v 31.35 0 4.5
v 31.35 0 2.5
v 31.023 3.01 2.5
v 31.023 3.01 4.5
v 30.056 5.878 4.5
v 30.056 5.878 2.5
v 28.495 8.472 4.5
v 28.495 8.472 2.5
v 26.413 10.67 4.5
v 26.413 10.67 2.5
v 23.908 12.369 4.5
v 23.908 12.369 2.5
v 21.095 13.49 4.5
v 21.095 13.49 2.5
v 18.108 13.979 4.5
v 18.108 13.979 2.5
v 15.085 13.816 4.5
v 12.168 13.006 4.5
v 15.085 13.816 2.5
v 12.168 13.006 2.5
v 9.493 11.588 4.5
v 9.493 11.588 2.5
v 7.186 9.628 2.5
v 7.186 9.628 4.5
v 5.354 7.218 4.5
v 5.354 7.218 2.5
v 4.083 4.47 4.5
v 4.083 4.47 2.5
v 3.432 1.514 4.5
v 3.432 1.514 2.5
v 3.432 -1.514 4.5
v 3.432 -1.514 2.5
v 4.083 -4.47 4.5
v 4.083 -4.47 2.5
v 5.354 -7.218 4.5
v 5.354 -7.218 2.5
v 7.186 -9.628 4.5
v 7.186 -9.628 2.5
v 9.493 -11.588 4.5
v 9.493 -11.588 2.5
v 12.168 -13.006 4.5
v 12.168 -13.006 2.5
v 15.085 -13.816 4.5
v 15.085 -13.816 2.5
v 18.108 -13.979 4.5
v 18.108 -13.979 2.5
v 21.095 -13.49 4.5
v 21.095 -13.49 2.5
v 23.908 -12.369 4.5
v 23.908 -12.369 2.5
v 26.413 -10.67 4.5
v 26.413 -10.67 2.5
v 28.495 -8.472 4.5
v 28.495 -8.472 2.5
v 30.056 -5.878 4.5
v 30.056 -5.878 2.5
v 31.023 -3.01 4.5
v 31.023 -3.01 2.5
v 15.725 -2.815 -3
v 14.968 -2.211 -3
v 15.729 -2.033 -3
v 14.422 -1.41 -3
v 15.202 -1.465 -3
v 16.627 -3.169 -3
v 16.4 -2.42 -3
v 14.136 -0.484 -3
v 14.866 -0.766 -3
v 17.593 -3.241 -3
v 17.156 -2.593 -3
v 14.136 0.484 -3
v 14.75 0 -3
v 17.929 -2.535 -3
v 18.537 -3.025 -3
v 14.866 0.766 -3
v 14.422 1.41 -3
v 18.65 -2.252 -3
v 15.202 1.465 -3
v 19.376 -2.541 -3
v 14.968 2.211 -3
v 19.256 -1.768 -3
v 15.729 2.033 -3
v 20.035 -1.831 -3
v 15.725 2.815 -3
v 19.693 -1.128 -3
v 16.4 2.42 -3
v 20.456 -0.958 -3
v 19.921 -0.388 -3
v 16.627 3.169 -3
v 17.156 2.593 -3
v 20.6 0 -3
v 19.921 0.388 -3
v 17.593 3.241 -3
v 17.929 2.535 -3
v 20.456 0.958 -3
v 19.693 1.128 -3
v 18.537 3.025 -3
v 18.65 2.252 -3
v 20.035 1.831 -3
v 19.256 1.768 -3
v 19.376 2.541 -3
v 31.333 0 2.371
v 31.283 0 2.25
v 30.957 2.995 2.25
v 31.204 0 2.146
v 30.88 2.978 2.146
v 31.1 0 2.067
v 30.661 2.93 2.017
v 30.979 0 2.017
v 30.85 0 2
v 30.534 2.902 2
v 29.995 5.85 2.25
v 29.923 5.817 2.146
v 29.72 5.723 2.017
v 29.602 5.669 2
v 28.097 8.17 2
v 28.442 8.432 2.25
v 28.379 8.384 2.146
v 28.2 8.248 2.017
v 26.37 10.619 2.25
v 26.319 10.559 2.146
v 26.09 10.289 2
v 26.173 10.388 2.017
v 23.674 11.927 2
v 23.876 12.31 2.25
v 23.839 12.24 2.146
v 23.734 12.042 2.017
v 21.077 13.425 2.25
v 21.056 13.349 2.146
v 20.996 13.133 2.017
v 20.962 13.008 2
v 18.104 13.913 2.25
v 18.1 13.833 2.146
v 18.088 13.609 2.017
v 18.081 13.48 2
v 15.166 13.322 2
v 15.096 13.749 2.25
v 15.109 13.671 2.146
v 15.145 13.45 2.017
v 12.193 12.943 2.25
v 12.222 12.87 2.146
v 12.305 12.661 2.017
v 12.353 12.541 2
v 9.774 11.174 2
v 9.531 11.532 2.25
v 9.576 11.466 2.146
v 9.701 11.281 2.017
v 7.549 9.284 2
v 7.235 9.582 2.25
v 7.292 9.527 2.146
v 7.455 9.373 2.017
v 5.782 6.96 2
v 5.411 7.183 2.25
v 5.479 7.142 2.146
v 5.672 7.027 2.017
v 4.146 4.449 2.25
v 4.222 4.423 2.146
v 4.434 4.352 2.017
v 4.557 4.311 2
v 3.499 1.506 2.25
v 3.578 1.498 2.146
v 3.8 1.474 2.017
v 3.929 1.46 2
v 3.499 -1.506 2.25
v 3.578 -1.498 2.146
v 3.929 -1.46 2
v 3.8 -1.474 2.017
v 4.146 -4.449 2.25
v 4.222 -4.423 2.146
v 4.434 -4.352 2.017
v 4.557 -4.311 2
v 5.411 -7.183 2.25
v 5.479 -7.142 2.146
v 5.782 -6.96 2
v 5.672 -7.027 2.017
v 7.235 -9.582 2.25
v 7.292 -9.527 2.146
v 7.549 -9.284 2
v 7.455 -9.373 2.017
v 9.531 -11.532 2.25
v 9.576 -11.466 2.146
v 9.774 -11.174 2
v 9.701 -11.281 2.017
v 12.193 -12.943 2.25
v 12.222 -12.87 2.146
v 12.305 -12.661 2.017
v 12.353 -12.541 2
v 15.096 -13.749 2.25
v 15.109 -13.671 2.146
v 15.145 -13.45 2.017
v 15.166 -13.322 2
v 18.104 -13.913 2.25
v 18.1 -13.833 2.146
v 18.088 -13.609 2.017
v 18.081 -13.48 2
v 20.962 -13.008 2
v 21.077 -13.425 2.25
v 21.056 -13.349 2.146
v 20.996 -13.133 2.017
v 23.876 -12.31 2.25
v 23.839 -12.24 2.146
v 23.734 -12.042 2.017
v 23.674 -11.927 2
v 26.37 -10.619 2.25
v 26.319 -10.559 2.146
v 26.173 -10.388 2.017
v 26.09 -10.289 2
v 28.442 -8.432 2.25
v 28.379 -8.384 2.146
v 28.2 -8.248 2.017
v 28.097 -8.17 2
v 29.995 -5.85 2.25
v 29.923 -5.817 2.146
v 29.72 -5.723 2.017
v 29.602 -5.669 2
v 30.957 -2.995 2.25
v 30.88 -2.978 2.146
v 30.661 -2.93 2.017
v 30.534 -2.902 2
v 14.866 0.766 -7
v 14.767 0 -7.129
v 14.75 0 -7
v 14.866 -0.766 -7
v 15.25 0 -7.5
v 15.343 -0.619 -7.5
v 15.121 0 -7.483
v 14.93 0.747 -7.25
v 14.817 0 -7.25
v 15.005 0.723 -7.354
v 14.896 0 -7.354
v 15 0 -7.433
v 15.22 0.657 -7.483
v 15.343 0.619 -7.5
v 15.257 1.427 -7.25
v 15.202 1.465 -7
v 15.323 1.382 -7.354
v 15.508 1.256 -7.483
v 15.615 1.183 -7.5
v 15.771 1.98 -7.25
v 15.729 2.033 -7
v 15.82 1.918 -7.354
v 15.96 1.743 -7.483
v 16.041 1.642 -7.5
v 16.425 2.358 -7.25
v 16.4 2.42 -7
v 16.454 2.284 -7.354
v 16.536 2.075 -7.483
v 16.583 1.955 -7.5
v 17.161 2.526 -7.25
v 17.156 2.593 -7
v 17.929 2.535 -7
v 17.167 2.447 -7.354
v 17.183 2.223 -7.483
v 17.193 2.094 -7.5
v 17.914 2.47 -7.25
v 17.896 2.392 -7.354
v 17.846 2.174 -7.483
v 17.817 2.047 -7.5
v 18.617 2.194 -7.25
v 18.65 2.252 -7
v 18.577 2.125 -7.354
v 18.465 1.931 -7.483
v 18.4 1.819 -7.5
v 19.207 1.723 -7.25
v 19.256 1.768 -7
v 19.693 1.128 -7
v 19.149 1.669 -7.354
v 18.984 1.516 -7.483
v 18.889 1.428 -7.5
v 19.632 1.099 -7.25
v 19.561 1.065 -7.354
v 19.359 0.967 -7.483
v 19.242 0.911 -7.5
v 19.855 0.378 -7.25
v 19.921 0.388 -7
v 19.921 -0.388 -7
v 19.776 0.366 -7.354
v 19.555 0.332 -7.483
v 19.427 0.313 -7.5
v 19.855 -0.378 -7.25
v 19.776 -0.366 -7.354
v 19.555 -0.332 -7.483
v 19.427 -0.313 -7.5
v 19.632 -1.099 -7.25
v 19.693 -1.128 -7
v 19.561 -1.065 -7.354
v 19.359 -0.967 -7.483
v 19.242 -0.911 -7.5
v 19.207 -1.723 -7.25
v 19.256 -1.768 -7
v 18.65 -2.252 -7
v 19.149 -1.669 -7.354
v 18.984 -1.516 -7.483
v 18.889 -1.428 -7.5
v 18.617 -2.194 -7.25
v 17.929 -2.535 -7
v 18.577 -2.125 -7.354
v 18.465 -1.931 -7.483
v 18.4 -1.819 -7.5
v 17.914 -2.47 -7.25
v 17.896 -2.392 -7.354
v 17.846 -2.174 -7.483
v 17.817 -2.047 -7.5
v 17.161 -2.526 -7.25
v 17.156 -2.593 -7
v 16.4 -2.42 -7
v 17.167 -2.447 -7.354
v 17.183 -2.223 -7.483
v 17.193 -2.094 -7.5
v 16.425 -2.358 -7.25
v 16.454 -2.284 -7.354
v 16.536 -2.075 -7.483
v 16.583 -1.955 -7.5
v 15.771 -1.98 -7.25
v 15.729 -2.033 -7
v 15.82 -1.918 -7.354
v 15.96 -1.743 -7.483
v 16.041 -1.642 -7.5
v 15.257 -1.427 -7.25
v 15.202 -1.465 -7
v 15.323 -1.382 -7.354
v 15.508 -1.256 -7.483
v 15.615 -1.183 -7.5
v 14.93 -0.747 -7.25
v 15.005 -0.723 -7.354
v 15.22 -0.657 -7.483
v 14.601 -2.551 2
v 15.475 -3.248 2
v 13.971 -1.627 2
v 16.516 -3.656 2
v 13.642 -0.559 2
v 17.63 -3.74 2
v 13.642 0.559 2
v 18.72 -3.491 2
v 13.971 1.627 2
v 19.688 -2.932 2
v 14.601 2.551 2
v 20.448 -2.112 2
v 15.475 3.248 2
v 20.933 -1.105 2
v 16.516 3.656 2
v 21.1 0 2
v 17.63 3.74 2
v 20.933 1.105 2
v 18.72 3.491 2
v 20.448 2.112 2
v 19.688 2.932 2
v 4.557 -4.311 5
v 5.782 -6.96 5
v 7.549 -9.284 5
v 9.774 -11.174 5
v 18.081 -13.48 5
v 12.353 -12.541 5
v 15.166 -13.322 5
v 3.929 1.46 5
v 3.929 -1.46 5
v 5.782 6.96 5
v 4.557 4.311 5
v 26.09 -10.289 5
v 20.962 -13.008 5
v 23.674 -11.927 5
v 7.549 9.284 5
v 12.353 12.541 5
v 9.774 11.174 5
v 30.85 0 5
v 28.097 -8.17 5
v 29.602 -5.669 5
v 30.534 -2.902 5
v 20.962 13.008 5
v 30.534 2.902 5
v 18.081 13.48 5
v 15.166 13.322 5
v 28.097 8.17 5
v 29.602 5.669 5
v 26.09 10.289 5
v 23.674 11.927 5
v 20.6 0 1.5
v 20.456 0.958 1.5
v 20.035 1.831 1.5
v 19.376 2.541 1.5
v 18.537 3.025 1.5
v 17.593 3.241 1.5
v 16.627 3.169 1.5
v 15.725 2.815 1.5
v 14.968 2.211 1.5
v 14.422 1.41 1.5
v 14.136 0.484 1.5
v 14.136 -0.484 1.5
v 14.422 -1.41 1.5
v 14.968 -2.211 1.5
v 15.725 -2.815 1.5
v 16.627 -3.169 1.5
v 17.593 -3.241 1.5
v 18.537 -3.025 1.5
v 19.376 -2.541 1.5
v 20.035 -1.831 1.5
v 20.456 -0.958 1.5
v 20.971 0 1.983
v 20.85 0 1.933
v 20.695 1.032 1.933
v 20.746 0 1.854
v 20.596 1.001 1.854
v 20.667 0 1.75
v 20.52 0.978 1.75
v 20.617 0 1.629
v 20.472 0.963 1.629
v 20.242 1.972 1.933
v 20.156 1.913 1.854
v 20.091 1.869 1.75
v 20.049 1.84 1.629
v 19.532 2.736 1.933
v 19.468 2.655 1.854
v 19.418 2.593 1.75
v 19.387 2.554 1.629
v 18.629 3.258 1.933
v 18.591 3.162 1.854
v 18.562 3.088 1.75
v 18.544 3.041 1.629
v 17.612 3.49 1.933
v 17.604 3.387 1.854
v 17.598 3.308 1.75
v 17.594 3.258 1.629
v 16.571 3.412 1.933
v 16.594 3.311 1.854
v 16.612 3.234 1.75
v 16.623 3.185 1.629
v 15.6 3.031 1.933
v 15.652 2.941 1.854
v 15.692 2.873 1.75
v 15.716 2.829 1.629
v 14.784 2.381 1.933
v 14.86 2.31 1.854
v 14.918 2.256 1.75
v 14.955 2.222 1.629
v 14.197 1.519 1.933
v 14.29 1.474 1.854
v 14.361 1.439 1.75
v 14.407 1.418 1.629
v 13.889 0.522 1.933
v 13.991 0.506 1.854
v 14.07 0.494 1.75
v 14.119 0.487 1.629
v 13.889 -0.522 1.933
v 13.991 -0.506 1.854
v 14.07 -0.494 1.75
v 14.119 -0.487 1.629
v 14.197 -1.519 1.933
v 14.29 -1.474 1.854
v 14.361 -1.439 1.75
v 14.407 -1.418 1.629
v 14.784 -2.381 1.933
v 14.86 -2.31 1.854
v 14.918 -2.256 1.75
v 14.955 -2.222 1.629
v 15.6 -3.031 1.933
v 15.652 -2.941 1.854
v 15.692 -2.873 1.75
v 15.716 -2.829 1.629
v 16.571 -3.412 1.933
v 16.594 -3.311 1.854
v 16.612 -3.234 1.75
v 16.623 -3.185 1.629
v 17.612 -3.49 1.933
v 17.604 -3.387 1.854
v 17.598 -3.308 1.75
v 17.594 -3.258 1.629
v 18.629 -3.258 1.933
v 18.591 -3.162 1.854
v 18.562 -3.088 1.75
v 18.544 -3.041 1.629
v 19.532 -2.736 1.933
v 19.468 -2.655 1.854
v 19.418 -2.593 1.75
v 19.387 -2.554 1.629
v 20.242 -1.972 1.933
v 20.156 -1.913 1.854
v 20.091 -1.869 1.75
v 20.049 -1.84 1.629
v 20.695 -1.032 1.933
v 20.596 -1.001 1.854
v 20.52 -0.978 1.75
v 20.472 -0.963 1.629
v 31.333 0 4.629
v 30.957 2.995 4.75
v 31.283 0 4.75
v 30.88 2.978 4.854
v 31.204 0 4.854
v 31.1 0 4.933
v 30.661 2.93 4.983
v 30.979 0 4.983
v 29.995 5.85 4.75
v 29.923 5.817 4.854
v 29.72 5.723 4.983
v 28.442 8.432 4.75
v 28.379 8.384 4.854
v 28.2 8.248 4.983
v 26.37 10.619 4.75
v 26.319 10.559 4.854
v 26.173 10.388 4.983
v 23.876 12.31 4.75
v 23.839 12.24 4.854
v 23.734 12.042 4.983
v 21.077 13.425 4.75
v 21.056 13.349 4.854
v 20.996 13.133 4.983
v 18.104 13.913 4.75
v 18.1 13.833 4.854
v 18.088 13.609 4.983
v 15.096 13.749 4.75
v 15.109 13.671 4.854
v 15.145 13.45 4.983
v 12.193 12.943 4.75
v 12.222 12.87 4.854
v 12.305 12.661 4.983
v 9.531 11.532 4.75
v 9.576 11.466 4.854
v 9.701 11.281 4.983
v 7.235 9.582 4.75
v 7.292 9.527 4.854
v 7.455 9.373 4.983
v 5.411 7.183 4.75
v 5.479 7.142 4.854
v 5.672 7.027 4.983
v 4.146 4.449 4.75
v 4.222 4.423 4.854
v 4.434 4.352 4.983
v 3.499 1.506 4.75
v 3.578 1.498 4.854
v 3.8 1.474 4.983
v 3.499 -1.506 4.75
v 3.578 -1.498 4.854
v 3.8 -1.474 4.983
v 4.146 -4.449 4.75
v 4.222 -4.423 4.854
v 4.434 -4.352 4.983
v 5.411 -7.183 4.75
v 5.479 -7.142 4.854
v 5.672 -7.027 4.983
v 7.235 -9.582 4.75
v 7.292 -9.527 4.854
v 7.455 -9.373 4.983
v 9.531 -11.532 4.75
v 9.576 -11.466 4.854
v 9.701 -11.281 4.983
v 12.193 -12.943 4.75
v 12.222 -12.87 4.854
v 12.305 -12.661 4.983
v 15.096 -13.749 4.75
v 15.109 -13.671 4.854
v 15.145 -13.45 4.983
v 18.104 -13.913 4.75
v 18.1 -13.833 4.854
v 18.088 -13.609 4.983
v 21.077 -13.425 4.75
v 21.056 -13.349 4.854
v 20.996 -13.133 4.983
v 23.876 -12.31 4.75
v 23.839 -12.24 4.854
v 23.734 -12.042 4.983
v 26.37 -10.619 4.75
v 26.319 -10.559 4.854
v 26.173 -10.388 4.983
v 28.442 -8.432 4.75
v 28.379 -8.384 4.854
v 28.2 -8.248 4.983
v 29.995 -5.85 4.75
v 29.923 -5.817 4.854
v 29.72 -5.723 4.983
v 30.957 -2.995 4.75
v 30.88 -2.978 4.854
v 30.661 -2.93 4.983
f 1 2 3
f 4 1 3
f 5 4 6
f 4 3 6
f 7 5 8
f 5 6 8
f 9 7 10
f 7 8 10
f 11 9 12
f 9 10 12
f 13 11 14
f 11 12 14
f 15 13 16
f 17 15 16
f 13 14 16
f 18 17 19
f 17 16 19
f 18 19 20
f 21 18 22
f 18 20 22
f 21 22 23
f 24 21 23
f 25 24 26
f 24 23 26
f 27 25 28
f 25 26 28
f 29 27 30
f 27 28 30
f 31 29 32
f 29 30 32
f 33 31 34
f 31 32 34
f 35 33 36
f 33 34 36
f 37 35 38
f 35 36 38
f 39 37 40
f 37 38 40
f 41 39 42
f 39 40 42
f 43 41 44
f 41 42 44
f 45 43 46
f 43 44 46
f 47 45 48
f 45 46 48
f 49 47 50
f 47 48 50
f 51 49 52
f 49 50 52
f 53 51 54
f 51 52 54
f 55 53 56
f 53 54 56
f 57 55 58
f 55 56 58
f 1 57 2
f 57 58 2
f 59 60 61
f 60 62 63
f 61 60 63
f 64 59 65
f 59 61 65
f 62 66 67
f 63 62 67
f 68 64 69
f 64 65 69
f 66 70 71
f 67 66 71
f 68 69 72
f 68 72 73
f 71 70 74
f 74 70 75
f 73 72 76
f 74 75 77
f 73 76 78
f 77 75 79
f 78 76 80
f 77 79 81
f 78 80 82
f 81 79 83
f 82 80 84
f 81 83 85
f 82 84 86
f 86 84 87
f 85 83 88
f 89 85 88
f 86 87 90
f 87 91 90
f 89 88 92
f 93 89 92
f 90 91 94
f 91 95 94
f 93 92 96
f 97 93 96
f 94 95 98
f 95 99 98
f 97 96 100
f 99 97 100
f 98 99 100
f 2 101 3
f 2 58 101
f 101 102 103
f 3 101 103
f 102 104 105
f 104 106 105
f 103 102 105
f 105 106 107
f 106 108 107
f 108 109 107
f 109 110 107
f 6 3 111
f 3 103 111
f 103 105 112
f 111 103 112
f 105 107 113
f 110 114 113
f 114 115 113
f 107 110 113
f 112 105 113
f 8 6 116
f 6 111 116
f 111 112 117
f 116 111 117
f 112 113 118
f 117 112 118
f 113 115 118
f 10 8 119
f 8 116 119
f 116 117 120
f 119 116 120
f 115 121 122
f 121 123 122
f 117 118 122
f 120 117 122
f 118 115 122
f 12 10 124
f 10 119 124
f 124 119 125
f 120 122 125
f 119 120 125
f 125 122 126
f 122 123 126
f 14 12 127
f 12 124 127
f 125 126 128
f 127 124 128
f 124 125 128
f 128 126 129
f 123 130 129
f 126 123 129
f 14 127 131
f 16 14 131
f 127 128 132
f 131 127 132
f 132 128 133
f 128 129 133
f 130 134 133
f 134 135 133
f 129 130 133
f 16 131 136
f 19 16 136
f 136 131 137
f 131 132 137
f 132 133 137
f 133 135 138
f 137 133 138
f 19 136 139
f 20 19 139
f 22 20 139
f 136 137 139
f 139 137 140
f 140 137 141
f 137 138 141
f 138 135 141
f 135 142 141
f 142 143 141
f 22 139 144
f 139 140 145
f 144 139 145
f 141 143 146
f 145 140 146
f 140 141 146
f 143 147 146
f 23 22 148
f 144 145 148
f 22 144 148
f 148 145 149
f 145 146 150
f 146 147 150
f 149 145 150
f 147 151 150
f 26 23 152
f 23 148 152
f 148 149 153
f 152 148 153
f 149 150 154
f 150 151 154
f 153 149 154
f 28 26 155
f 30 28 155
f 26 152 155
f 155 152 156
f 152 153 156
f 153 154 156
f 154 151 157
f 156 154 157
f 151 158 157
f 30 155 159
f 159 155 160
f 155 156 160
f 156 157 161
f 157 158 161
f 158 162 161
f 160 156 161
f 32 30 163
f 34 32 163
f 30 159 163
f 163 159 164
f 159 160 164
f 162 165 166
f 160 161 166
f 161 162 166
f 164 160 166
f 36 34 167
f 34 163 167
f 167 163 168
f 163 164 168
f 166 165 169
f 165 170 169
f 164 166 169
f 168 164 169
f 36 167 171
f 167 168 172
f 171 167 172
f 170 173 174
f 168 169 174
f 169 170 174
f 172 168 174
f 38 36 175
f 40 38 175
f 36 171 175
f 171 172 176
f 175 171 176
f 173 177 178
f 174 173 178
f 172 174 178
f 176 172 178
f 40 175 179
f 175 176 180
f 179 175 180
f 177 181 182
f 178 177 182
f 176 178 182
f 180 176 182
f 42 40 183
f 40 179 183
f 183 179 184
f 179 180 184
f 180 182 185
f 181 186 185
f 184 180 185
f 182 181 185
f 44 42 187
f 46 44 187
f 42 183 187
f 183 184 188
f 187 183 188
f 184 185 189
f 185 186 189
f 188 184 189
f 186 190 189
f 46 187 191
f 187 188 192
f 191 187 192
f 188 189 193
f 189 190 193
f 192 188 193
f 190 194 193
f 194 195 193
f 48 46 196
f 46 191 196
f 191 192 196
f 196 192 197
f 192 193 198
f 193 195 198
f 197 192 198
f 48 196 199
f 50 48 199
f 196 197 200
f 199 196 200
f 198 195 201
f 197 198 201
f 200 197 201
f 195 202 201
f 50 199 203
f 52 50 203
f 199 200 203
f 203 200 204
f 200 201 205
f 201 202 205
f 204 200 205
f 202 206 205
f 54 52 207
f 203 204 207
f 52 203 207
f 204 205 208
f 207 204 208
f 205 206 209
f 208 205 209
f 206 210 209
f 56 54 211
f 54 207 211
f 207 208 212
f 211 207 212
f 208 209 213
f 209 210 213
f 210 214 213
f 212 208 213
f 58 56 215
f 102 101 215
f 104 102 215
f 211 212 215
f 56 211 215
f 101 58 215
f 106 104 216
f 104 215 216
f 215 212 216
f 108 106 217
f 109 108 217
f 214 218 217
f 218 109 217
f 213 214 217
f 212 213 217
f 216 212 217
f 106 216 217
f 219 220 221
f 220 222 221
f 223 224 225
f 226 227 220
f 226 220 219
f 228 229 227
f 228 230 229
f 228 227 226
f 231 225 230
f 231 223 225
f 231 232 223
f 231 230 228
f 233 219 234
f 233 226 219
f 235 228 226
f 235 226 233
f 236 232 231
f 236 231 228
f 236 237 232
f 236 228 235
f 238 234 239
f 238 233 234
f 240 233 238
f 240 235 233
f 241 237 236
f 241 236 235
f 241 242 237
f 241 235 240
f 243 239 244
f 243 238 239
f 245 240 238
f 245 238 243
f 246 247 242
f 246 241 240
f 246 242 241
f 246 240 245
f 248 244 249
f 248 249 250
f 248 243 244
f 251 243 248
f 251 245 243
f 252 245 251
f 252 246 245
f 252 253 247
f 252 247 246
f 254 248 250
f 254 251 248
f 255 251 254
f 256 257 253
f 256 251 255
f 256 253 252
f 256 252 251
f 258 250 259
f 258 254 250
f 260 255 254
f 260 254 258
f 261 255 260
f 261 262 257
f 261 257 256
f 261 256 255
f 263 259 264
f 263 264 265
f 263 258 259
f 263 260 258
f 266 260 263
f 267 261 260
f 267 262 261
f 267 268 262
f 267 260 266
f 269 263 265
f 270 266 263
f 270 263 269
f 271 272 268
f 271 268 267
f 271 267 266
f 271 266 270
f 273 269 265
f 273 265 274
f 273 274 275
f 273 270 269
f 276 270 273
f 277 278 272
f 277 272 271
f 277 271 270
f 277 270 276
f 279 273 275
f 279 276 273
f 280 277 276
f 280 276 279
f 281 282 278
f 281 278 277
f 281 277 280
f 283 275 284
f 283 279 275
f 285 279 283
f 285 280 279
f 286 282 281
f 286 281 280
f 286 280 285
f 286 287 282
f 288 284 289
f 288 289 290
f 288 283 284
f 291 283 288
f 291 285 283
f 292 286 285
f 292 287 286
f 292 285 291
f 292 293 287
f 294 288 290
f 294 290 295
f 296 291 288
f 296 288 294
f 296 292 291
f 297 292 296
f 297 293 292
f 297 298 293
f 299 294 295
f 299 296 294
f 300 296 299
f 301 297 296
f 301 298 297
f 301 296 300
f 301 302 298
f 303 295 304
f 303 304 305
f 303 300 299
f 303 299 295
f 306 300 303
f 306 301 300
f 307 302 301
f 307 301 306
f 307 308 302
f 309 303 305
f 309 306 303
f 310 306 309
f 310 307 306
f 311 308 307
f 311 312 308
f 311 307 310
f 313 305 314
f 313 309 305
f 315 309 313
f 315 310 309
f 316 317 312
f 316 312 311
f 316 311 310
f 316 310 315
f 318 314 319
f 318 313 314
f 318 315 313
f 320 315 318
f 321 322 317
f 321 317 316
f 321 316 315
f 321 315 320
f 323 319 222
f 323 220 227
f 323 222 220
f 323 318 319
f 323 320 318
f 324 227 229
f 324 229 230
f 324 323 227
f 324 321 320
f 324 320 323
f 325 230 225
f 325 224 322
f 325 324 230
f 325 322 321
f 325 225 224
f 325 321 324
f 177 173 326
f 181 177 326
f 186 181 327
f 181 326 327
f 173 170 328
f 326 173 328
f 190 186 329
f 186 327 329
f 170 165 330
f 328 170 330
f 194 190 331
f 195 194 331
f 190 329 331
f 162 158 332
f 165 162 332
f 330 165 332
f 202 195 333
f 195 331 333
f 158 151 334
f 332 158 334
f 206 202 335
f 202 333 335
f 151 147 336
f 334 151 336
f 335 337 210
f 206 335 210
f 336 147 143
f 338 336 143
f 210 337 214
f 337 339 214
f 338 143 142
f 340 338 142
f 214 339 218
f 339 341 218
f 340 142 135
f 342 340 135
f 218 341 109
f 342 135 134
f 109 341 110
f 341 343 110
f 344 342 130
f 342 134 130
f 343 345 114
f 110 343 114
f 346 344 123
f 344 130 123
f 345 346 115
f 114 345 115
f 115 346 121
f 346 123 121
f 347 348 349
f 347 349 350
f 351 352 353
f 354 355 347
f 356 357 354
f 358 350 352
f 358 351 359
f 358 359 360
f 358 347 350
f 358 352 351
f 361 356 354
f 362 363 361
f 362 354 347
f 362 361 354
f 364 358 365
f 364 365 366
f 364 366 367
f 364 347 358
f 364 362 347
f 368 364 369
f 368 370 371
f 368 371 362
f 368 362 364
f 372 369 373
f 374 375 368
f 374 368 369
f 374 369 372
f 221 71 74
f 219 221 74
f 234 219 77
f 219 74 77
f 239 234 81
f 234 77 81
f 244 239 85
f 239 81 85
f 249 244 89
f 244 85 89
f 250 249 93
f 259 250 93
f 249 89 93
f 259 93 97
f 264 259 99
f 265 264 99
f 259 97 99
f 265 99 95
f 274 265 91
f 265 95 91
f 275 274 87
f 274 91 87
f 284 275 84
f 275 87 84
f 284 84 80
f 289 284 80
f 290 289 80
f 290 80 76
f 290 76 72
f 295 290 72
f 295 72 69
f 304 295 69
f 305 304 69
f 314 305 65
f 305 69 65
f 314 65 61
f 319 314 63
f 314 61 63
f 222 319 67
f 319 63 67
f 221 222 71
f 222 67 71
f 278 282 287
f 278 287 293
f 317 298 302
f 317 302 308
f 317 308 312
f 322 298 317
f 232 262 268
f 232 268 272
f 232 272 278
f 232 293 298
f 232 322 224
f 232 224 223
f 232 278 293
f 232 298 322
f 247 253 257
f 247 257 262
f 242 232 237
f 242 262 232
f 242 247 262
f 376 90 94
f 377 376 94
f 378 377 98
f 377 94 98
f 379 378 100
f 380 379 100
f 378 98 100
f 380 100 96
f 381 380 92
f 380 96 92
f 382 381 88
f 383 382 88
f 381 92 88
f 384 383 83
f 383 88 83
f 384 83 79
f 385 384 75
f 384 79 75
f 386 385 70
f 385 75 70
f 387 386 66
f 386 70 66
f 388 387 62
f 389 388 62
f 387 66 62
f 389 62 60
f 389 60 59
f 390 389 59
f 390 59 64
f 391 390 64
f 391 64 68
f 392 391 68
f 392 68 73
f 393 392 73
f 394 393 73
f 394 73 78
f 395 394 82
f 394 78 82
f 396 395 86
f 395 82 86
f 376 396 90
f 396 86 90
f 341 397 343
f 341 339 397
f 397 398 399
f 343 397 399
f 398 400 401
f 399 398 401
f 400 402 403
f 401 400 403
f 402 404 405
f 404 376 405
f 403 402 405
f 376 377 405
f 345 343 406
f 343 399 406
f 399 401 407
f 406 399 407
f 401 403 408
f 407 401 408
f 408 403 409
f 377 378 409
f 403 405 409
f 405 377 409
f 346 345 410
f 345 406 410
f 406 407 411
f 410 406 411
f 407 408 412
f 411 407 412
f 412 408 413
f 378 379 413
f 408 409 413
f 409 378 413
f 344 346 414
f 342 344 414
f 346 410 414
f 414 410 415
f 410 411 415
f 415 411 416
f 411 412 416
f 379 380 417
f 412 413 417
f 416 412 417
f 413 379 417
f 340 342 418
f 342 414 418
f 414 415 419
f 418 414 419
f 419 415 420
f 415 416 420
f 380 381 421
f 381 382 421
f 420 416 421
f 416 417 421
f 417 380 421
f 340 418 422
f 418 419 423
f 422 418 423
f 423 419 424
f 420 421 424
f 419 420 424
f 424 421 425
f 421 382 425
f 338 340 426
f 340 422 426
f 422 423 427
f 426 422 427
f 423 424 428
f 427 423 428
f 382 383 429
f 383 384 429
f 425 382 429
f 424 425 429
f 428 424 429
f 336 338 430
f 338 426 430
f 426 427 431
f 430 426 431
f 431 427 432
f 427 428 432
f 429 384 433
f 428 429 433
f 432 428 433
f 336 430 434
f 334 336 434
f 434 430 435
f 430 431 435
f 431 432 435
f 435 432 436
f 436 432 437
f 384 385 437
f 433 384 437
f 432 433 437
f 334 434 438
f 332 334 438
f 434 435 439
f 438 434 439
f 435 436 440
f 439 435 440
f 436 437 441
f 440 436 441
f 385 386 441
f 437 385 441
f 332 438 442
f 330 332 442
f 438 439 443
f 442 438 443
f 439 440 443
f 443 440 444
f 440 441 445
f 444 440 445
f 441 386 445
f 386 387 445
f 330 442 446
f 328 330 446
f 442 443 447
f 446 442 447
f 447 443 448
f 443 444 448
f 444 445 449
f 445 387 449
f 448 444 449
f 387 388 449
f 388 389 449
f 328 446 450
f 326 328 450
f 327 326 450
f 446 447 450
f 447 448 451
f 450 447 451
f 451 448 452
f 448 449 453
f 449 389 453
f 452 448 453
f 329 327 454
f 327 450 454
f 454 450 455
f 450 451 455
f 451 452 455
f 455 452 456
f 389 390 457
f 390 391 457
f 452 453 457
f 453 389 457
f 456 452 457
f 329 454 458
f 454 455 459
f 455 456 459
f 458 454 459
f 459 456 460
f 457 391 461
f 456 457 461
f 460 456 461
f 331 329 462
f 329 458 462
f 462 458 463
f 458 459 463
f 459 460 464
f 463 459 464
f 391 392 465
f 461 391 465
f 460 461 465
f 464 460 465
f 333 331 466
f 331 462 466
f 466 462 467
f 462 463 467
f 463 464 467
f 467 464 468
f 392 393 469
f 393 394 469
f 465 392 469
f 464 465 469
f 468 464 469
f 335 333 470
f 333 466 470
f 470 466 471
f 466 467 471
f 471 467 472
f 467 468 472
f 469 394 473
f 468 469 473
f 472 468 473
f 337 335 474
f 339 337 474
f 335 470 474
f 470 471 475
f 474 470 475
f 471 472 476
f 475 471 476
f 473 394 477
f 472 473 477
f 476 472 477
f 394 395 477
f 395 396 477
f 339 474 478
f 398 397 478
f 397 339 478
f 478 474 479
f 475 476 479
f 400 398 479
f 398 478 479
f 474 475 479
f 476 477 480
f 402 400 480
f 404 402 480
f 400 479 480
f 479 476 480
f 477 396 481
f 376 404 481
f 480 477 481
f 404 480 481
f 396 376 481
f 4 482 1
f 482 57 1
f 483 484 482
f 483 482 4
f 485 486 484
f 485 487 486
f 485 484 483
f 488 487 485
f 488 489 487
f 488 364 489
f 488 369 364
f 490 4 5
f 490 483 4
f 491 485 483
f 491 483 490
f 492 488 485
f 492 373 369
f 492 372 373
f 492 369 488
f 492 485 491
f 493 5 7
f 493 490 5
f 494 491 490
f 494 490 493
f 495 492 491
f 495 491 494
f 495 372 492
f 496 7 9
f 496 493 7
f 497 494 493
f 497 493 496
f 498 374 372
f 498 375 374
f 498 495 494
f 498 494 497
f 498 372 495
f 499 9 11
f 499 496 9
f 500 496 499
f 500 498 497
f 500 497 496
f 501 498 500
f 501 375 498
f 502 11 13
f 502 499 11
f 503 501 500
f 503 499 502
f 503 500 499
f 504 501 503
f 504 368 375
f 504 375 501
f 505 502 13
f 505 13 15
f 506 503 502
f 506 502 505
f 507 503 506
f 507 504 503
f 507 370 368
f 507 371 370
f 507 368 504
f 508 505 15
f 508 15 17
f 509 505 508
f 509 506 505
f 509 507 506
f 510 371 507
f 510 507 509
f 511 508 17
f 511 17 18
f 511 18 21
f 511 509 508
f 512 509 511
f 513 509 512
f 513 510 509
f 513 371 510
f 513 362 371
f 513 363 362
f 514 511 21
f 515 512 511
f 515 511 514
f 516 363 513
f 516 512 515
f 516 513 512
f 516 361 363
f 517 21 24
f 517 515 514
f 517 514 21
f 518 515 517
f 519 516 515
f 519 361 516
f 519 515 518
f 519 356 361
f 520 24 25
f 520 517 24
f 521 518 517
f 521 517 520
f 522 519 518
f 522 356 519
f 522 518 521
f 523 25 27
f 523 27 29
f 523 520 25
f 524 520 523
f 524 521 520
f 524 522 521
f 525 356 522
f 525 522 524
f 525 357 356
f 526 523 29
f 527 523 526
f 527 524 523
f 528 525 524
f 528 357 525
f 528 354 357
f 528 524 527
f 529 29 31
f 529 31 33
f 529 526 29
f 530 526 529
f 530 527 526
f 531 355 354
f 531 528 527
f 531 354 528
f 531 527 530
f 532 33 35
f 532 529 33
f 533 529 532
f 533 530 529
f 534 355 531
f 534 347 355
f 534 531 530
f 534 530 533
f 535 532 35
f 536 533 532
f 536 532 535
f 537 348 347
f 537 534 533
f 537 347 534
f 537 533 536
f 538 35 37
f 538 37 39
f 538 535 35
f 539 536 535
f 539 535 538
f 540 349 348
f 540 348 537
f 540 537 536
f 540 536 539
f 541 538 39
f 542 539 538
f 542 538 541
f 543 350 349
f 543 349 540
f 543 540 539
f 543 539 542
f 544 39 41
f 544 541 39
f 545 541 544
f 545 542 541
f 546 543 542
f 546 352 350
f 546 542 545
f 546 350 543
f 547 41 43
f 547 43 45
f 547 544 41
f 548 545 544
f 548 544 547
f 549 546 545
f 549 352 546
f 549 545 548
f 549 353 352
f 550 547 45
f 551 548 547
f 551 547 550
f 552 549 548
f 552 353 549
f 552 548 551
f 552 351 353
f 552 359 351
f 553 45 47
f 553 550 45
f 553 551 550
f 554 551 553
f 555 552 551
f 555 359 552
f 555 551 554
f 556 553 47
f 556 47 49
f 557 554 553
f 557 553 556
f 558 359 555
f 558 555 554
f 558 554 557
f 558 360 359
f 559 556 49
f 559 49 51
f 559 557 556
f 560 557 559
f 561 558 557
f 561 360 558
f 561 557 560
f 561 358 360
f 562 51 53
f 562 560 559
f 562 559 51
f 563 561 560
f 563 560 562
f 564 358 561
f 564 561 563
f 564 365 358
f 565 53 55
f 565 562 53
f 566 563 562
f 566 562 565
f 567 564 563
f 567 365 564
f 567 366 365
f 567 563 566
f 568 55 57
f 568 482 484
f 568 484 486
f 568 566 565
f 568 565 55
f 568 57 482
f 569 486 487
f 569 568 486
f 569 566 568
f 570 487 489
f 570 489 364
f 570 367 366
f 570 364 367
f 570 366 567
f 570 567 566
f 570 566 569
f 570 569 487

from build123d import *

# Parameters (mm, degrees)
BOSS_EXTRUDE1_DEPTH      = 2
BOSS_EXTRUDE1_DEPTH_BACK = 3
SKETCH1_R                = 3.25
SKETCH2_R                = 14
BOSS_EXTRUDE2_DEPTH      = 3
SKETCH3_R                = 2.6
BOSS_EXTRUDE3_DEPTH      = 4.5
FILLET1_R                = 0.5


with BuildPart() as part:
    # Sketch1 → Boss-Extrude1 (new, two sides: drawn at the far end of the back side and taken through both)
    with BuildSketch(Plane.XY.offset(-BOSS_EXTRUDE1_DEPTH_BACK)):
        with Locations((17.35, 0)):
            Circle(SKETCH1_R)
    extrude(amount=BOSS_EXTRUDE1_DEPTH + BOSS_EXTRUDE1_DEPTH_BACK)

    # Sketch2 → Boss-Extrude2 (add)
    with BuildSketch(Plane.XY.offset(2)):
        with Locations((17.35, 0)):
            Circle(SKETCH2_R)
    extrude(amount=BOSS_EXTRUDE2_DEPTH)

    # Sketch3 → Boss-Extrude3 (add)
    with BuildSketch(Plane(origin=(0, 0, -3), x_dir=(-1, 0, 0), z_dir=(0, 0, -1))):
        with Locations((-17.35, 0)):
            Circle(SKETCH3_R)
    extrude(amount=BOSS_EXTRUDE3_DEPTH)

    # Fillet1
    fillet1_edges = [part.edges().sort_by_distance(p)[0] for p in [
        (19.95, 0, -7.5),
        (14.1, 0, 2),
        (3.35, 0, 2),
        (3.35, 0, 5),
    ]]
    fillet(fillet1_edges, radius=FILLET1_R)


solid = part.part
